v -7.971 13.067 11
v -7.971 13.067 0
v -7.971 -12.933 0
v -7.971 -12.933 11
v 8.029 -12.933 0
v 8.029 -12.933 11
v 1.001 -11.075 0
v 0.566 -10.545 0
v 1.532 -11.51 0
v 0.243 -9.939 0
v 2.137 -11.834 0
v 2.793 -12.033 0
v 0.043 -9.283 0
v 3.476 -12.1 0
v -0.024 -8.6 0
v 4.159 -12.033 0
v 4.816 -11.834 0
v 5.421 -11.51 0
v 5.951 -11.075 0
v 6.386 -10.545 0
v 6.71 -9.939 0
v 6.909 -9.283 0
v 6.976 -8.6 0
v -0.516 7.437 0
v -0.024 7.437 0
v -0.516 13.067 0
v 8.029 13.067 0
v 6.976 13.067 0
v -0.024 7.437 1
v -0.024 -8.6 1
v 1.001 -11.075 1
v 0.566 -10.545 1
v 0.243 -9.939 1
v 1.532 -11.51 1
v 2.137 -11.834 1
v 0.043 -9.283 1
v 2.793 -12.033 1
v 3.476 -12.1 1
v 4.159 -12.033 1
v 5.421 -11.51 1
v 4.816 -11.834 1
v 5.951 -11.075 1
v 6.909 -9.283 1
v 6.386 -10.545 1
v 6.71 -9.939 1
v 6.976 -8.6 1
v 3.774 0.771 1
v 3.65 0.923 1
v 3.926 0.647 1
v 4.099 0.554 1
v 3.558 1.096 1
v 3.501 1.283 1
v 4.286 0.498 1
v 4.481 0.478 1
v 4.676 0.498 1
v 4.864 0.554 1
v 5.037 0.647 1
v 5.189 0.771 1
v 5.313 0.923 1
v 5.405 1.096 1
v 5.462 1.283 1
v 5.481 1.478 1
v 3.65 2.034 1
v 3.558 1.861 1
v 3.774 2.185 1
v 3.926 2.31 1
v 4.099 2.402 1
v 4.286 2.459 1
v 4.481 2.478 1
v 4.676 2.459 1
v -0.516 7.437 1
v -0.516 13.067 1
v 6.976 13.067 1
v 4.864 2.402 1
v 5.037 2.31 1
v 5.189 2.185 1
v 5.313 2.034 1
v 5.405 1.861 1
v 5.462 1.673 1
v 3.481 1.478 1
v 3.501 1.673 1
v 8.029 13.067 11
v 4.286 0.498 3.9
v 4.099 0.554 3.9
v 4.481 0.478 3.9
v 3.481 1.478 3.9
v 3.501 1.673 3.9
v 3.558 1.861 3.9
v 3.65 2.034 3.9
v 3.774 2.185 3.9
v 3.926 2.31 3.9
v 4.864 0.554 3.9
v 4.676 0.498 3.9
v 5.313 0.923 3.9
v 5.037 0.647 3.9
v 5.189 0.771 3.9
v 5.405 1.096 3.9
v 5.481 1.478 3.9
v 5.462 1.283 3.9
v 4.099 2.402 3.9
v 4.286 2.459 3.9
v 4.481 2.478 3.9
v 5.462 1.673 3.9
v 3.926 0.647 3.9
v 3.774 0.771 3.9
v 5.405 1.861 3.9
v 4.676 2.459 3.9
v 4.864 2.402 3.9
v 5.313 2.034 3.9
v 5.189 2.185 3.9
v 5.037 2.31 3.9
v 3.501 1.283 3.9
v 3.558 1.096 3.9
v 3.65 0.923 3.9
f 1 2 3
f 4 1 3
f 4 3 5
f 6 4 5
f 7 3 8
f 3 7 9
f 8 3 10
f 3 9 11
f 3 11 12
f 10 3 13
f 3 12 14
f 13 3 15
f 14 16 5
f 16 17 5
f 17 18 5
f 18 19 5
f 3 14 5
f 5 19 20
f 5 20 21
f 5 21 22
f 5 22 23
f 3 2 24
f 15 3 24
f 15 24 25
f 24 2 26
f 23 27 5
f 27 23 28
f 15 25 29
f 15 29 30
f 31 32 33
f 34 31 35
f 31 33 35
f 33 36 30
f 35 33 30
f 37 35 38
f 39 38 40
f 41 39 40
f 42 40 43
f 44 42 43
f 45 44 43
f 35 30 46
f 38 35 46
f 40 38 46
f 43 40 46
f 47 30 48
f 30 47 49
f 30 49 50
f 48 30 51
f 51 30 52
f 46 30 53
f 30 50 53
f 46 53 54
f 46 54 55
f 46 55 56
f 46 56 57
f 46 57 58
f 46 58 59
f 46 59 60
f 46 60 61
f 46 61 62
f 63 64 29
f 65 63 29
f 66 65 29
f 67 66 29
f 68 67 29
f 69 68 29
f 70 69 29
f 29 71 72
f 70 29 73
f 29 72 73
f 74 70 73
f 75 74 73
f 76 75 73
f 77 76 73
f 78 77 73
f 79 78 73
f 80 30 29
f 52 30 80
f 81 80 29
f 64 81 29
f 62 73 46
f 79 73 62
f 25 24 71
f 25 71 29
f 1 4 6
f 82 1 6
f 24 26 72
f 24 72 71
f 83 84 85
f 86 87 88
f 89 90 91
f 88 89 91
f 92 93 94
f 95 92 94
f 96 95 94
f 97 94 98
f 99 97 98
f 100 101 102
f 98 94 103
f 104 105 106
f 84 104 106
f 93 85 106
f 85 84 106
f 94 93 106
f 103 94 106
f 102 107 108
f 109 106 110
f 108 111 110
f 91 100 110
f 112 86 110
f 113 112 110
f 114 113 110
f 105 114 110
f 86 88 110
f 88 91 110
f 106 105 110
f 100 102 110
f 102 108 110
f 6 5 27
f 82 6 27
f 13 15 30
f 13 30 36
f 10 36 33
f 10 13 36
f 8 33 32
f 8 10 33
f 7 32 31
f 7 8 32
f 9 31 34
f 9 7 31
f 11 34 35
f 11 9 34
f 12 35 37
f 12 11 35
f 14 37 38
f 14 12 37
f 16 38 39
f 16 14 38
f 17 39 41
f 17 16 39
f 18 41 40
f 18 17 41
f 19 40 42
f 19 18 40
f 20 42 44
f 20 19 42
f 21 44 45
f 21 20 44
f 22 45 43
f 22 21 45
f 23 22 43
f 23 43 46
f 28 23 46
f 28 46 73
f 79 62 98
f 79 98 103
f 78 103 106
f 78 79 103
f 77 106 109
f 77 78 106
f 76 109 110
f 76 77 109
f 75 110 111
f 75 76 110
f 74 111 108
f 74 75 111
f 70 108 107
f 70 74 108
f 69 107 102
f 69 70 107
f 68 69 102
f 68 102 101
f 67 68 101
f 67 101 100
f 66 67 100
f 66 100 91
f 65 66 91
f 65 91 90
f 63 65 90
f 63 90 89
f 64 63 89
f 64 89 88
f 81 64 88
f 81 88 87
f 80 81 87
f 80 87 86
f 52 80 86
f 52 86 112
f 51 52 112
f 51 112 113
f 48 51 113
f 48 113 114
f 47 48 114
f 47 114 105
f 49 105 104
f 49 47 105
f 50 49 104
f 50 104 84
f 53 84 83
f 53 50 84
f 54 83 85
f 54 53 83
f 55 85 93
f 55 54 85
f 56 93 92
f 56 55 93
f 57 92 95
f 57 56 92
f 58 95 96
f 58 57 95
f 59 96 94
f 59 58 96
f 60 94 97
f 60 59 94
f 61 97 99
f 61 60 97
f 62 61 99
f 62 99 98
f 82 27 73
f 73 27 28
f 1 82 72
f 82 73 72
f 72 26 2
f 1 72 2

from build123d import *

# Parameters (mm, degrees)
F1_DEPTH = 11
F2_R     = 1
F3_DEPTH = 1
F4_DEPTH = 3.9


with BuildPart() as f1:
    # F0 (on Top) → F1 (new body)
    with BuildSketch(Plane.XY):
        Polygon((-7.970938, -12.932724), (8.029062, -12.932724), (8.029062, 13.067276), (4.129676, 13.067276), (0.029062, 13.067276), (-7.970938, 13.067276), align=None)
    extrude(amount=F1_DEPTH)

    # F2 (on Top) → F3 (cut)
    with BuildSketch(Plane.XY):
        with BuildLine():
            Line((-0.023847, 7.43662), (-0.023847, -8.600051))
            ThreePointArc((-0.023847, -8.600051), (3.476153, -12.100051), (6.976153, -8.600051))
            Line((6.976153, -8.600051), (6.976153, 15.099979))
            Line((6.976153, 15.099979), (-0.516003, 14.27335))
            Line((-0.516003, 14.27335), (-0.516003, 7.43662))
            Line((-0.516003, 7.43662), (-0.023847, 7.43662))
        make_face()
        with Locations((4.481404, 1.478317)):
            Circle(F2_R, mode=Mode.SUBTRACT)
        with Locations((4.481404, 1.478317)):
            Circle(F2_R)
    extrude(amount=F3_DEPTH, mode=Mode.SUBTRACT)

    # F2 (on Top) → F4 (cut)
    with BuildSketch(Plane.XY):
        with Locations((4.481404, 1.478317)):
            Circle(F2_R)
    extrude(amount=F4_DEPTH, mode=Mode.SUBTRACT)


solid = f1.part
